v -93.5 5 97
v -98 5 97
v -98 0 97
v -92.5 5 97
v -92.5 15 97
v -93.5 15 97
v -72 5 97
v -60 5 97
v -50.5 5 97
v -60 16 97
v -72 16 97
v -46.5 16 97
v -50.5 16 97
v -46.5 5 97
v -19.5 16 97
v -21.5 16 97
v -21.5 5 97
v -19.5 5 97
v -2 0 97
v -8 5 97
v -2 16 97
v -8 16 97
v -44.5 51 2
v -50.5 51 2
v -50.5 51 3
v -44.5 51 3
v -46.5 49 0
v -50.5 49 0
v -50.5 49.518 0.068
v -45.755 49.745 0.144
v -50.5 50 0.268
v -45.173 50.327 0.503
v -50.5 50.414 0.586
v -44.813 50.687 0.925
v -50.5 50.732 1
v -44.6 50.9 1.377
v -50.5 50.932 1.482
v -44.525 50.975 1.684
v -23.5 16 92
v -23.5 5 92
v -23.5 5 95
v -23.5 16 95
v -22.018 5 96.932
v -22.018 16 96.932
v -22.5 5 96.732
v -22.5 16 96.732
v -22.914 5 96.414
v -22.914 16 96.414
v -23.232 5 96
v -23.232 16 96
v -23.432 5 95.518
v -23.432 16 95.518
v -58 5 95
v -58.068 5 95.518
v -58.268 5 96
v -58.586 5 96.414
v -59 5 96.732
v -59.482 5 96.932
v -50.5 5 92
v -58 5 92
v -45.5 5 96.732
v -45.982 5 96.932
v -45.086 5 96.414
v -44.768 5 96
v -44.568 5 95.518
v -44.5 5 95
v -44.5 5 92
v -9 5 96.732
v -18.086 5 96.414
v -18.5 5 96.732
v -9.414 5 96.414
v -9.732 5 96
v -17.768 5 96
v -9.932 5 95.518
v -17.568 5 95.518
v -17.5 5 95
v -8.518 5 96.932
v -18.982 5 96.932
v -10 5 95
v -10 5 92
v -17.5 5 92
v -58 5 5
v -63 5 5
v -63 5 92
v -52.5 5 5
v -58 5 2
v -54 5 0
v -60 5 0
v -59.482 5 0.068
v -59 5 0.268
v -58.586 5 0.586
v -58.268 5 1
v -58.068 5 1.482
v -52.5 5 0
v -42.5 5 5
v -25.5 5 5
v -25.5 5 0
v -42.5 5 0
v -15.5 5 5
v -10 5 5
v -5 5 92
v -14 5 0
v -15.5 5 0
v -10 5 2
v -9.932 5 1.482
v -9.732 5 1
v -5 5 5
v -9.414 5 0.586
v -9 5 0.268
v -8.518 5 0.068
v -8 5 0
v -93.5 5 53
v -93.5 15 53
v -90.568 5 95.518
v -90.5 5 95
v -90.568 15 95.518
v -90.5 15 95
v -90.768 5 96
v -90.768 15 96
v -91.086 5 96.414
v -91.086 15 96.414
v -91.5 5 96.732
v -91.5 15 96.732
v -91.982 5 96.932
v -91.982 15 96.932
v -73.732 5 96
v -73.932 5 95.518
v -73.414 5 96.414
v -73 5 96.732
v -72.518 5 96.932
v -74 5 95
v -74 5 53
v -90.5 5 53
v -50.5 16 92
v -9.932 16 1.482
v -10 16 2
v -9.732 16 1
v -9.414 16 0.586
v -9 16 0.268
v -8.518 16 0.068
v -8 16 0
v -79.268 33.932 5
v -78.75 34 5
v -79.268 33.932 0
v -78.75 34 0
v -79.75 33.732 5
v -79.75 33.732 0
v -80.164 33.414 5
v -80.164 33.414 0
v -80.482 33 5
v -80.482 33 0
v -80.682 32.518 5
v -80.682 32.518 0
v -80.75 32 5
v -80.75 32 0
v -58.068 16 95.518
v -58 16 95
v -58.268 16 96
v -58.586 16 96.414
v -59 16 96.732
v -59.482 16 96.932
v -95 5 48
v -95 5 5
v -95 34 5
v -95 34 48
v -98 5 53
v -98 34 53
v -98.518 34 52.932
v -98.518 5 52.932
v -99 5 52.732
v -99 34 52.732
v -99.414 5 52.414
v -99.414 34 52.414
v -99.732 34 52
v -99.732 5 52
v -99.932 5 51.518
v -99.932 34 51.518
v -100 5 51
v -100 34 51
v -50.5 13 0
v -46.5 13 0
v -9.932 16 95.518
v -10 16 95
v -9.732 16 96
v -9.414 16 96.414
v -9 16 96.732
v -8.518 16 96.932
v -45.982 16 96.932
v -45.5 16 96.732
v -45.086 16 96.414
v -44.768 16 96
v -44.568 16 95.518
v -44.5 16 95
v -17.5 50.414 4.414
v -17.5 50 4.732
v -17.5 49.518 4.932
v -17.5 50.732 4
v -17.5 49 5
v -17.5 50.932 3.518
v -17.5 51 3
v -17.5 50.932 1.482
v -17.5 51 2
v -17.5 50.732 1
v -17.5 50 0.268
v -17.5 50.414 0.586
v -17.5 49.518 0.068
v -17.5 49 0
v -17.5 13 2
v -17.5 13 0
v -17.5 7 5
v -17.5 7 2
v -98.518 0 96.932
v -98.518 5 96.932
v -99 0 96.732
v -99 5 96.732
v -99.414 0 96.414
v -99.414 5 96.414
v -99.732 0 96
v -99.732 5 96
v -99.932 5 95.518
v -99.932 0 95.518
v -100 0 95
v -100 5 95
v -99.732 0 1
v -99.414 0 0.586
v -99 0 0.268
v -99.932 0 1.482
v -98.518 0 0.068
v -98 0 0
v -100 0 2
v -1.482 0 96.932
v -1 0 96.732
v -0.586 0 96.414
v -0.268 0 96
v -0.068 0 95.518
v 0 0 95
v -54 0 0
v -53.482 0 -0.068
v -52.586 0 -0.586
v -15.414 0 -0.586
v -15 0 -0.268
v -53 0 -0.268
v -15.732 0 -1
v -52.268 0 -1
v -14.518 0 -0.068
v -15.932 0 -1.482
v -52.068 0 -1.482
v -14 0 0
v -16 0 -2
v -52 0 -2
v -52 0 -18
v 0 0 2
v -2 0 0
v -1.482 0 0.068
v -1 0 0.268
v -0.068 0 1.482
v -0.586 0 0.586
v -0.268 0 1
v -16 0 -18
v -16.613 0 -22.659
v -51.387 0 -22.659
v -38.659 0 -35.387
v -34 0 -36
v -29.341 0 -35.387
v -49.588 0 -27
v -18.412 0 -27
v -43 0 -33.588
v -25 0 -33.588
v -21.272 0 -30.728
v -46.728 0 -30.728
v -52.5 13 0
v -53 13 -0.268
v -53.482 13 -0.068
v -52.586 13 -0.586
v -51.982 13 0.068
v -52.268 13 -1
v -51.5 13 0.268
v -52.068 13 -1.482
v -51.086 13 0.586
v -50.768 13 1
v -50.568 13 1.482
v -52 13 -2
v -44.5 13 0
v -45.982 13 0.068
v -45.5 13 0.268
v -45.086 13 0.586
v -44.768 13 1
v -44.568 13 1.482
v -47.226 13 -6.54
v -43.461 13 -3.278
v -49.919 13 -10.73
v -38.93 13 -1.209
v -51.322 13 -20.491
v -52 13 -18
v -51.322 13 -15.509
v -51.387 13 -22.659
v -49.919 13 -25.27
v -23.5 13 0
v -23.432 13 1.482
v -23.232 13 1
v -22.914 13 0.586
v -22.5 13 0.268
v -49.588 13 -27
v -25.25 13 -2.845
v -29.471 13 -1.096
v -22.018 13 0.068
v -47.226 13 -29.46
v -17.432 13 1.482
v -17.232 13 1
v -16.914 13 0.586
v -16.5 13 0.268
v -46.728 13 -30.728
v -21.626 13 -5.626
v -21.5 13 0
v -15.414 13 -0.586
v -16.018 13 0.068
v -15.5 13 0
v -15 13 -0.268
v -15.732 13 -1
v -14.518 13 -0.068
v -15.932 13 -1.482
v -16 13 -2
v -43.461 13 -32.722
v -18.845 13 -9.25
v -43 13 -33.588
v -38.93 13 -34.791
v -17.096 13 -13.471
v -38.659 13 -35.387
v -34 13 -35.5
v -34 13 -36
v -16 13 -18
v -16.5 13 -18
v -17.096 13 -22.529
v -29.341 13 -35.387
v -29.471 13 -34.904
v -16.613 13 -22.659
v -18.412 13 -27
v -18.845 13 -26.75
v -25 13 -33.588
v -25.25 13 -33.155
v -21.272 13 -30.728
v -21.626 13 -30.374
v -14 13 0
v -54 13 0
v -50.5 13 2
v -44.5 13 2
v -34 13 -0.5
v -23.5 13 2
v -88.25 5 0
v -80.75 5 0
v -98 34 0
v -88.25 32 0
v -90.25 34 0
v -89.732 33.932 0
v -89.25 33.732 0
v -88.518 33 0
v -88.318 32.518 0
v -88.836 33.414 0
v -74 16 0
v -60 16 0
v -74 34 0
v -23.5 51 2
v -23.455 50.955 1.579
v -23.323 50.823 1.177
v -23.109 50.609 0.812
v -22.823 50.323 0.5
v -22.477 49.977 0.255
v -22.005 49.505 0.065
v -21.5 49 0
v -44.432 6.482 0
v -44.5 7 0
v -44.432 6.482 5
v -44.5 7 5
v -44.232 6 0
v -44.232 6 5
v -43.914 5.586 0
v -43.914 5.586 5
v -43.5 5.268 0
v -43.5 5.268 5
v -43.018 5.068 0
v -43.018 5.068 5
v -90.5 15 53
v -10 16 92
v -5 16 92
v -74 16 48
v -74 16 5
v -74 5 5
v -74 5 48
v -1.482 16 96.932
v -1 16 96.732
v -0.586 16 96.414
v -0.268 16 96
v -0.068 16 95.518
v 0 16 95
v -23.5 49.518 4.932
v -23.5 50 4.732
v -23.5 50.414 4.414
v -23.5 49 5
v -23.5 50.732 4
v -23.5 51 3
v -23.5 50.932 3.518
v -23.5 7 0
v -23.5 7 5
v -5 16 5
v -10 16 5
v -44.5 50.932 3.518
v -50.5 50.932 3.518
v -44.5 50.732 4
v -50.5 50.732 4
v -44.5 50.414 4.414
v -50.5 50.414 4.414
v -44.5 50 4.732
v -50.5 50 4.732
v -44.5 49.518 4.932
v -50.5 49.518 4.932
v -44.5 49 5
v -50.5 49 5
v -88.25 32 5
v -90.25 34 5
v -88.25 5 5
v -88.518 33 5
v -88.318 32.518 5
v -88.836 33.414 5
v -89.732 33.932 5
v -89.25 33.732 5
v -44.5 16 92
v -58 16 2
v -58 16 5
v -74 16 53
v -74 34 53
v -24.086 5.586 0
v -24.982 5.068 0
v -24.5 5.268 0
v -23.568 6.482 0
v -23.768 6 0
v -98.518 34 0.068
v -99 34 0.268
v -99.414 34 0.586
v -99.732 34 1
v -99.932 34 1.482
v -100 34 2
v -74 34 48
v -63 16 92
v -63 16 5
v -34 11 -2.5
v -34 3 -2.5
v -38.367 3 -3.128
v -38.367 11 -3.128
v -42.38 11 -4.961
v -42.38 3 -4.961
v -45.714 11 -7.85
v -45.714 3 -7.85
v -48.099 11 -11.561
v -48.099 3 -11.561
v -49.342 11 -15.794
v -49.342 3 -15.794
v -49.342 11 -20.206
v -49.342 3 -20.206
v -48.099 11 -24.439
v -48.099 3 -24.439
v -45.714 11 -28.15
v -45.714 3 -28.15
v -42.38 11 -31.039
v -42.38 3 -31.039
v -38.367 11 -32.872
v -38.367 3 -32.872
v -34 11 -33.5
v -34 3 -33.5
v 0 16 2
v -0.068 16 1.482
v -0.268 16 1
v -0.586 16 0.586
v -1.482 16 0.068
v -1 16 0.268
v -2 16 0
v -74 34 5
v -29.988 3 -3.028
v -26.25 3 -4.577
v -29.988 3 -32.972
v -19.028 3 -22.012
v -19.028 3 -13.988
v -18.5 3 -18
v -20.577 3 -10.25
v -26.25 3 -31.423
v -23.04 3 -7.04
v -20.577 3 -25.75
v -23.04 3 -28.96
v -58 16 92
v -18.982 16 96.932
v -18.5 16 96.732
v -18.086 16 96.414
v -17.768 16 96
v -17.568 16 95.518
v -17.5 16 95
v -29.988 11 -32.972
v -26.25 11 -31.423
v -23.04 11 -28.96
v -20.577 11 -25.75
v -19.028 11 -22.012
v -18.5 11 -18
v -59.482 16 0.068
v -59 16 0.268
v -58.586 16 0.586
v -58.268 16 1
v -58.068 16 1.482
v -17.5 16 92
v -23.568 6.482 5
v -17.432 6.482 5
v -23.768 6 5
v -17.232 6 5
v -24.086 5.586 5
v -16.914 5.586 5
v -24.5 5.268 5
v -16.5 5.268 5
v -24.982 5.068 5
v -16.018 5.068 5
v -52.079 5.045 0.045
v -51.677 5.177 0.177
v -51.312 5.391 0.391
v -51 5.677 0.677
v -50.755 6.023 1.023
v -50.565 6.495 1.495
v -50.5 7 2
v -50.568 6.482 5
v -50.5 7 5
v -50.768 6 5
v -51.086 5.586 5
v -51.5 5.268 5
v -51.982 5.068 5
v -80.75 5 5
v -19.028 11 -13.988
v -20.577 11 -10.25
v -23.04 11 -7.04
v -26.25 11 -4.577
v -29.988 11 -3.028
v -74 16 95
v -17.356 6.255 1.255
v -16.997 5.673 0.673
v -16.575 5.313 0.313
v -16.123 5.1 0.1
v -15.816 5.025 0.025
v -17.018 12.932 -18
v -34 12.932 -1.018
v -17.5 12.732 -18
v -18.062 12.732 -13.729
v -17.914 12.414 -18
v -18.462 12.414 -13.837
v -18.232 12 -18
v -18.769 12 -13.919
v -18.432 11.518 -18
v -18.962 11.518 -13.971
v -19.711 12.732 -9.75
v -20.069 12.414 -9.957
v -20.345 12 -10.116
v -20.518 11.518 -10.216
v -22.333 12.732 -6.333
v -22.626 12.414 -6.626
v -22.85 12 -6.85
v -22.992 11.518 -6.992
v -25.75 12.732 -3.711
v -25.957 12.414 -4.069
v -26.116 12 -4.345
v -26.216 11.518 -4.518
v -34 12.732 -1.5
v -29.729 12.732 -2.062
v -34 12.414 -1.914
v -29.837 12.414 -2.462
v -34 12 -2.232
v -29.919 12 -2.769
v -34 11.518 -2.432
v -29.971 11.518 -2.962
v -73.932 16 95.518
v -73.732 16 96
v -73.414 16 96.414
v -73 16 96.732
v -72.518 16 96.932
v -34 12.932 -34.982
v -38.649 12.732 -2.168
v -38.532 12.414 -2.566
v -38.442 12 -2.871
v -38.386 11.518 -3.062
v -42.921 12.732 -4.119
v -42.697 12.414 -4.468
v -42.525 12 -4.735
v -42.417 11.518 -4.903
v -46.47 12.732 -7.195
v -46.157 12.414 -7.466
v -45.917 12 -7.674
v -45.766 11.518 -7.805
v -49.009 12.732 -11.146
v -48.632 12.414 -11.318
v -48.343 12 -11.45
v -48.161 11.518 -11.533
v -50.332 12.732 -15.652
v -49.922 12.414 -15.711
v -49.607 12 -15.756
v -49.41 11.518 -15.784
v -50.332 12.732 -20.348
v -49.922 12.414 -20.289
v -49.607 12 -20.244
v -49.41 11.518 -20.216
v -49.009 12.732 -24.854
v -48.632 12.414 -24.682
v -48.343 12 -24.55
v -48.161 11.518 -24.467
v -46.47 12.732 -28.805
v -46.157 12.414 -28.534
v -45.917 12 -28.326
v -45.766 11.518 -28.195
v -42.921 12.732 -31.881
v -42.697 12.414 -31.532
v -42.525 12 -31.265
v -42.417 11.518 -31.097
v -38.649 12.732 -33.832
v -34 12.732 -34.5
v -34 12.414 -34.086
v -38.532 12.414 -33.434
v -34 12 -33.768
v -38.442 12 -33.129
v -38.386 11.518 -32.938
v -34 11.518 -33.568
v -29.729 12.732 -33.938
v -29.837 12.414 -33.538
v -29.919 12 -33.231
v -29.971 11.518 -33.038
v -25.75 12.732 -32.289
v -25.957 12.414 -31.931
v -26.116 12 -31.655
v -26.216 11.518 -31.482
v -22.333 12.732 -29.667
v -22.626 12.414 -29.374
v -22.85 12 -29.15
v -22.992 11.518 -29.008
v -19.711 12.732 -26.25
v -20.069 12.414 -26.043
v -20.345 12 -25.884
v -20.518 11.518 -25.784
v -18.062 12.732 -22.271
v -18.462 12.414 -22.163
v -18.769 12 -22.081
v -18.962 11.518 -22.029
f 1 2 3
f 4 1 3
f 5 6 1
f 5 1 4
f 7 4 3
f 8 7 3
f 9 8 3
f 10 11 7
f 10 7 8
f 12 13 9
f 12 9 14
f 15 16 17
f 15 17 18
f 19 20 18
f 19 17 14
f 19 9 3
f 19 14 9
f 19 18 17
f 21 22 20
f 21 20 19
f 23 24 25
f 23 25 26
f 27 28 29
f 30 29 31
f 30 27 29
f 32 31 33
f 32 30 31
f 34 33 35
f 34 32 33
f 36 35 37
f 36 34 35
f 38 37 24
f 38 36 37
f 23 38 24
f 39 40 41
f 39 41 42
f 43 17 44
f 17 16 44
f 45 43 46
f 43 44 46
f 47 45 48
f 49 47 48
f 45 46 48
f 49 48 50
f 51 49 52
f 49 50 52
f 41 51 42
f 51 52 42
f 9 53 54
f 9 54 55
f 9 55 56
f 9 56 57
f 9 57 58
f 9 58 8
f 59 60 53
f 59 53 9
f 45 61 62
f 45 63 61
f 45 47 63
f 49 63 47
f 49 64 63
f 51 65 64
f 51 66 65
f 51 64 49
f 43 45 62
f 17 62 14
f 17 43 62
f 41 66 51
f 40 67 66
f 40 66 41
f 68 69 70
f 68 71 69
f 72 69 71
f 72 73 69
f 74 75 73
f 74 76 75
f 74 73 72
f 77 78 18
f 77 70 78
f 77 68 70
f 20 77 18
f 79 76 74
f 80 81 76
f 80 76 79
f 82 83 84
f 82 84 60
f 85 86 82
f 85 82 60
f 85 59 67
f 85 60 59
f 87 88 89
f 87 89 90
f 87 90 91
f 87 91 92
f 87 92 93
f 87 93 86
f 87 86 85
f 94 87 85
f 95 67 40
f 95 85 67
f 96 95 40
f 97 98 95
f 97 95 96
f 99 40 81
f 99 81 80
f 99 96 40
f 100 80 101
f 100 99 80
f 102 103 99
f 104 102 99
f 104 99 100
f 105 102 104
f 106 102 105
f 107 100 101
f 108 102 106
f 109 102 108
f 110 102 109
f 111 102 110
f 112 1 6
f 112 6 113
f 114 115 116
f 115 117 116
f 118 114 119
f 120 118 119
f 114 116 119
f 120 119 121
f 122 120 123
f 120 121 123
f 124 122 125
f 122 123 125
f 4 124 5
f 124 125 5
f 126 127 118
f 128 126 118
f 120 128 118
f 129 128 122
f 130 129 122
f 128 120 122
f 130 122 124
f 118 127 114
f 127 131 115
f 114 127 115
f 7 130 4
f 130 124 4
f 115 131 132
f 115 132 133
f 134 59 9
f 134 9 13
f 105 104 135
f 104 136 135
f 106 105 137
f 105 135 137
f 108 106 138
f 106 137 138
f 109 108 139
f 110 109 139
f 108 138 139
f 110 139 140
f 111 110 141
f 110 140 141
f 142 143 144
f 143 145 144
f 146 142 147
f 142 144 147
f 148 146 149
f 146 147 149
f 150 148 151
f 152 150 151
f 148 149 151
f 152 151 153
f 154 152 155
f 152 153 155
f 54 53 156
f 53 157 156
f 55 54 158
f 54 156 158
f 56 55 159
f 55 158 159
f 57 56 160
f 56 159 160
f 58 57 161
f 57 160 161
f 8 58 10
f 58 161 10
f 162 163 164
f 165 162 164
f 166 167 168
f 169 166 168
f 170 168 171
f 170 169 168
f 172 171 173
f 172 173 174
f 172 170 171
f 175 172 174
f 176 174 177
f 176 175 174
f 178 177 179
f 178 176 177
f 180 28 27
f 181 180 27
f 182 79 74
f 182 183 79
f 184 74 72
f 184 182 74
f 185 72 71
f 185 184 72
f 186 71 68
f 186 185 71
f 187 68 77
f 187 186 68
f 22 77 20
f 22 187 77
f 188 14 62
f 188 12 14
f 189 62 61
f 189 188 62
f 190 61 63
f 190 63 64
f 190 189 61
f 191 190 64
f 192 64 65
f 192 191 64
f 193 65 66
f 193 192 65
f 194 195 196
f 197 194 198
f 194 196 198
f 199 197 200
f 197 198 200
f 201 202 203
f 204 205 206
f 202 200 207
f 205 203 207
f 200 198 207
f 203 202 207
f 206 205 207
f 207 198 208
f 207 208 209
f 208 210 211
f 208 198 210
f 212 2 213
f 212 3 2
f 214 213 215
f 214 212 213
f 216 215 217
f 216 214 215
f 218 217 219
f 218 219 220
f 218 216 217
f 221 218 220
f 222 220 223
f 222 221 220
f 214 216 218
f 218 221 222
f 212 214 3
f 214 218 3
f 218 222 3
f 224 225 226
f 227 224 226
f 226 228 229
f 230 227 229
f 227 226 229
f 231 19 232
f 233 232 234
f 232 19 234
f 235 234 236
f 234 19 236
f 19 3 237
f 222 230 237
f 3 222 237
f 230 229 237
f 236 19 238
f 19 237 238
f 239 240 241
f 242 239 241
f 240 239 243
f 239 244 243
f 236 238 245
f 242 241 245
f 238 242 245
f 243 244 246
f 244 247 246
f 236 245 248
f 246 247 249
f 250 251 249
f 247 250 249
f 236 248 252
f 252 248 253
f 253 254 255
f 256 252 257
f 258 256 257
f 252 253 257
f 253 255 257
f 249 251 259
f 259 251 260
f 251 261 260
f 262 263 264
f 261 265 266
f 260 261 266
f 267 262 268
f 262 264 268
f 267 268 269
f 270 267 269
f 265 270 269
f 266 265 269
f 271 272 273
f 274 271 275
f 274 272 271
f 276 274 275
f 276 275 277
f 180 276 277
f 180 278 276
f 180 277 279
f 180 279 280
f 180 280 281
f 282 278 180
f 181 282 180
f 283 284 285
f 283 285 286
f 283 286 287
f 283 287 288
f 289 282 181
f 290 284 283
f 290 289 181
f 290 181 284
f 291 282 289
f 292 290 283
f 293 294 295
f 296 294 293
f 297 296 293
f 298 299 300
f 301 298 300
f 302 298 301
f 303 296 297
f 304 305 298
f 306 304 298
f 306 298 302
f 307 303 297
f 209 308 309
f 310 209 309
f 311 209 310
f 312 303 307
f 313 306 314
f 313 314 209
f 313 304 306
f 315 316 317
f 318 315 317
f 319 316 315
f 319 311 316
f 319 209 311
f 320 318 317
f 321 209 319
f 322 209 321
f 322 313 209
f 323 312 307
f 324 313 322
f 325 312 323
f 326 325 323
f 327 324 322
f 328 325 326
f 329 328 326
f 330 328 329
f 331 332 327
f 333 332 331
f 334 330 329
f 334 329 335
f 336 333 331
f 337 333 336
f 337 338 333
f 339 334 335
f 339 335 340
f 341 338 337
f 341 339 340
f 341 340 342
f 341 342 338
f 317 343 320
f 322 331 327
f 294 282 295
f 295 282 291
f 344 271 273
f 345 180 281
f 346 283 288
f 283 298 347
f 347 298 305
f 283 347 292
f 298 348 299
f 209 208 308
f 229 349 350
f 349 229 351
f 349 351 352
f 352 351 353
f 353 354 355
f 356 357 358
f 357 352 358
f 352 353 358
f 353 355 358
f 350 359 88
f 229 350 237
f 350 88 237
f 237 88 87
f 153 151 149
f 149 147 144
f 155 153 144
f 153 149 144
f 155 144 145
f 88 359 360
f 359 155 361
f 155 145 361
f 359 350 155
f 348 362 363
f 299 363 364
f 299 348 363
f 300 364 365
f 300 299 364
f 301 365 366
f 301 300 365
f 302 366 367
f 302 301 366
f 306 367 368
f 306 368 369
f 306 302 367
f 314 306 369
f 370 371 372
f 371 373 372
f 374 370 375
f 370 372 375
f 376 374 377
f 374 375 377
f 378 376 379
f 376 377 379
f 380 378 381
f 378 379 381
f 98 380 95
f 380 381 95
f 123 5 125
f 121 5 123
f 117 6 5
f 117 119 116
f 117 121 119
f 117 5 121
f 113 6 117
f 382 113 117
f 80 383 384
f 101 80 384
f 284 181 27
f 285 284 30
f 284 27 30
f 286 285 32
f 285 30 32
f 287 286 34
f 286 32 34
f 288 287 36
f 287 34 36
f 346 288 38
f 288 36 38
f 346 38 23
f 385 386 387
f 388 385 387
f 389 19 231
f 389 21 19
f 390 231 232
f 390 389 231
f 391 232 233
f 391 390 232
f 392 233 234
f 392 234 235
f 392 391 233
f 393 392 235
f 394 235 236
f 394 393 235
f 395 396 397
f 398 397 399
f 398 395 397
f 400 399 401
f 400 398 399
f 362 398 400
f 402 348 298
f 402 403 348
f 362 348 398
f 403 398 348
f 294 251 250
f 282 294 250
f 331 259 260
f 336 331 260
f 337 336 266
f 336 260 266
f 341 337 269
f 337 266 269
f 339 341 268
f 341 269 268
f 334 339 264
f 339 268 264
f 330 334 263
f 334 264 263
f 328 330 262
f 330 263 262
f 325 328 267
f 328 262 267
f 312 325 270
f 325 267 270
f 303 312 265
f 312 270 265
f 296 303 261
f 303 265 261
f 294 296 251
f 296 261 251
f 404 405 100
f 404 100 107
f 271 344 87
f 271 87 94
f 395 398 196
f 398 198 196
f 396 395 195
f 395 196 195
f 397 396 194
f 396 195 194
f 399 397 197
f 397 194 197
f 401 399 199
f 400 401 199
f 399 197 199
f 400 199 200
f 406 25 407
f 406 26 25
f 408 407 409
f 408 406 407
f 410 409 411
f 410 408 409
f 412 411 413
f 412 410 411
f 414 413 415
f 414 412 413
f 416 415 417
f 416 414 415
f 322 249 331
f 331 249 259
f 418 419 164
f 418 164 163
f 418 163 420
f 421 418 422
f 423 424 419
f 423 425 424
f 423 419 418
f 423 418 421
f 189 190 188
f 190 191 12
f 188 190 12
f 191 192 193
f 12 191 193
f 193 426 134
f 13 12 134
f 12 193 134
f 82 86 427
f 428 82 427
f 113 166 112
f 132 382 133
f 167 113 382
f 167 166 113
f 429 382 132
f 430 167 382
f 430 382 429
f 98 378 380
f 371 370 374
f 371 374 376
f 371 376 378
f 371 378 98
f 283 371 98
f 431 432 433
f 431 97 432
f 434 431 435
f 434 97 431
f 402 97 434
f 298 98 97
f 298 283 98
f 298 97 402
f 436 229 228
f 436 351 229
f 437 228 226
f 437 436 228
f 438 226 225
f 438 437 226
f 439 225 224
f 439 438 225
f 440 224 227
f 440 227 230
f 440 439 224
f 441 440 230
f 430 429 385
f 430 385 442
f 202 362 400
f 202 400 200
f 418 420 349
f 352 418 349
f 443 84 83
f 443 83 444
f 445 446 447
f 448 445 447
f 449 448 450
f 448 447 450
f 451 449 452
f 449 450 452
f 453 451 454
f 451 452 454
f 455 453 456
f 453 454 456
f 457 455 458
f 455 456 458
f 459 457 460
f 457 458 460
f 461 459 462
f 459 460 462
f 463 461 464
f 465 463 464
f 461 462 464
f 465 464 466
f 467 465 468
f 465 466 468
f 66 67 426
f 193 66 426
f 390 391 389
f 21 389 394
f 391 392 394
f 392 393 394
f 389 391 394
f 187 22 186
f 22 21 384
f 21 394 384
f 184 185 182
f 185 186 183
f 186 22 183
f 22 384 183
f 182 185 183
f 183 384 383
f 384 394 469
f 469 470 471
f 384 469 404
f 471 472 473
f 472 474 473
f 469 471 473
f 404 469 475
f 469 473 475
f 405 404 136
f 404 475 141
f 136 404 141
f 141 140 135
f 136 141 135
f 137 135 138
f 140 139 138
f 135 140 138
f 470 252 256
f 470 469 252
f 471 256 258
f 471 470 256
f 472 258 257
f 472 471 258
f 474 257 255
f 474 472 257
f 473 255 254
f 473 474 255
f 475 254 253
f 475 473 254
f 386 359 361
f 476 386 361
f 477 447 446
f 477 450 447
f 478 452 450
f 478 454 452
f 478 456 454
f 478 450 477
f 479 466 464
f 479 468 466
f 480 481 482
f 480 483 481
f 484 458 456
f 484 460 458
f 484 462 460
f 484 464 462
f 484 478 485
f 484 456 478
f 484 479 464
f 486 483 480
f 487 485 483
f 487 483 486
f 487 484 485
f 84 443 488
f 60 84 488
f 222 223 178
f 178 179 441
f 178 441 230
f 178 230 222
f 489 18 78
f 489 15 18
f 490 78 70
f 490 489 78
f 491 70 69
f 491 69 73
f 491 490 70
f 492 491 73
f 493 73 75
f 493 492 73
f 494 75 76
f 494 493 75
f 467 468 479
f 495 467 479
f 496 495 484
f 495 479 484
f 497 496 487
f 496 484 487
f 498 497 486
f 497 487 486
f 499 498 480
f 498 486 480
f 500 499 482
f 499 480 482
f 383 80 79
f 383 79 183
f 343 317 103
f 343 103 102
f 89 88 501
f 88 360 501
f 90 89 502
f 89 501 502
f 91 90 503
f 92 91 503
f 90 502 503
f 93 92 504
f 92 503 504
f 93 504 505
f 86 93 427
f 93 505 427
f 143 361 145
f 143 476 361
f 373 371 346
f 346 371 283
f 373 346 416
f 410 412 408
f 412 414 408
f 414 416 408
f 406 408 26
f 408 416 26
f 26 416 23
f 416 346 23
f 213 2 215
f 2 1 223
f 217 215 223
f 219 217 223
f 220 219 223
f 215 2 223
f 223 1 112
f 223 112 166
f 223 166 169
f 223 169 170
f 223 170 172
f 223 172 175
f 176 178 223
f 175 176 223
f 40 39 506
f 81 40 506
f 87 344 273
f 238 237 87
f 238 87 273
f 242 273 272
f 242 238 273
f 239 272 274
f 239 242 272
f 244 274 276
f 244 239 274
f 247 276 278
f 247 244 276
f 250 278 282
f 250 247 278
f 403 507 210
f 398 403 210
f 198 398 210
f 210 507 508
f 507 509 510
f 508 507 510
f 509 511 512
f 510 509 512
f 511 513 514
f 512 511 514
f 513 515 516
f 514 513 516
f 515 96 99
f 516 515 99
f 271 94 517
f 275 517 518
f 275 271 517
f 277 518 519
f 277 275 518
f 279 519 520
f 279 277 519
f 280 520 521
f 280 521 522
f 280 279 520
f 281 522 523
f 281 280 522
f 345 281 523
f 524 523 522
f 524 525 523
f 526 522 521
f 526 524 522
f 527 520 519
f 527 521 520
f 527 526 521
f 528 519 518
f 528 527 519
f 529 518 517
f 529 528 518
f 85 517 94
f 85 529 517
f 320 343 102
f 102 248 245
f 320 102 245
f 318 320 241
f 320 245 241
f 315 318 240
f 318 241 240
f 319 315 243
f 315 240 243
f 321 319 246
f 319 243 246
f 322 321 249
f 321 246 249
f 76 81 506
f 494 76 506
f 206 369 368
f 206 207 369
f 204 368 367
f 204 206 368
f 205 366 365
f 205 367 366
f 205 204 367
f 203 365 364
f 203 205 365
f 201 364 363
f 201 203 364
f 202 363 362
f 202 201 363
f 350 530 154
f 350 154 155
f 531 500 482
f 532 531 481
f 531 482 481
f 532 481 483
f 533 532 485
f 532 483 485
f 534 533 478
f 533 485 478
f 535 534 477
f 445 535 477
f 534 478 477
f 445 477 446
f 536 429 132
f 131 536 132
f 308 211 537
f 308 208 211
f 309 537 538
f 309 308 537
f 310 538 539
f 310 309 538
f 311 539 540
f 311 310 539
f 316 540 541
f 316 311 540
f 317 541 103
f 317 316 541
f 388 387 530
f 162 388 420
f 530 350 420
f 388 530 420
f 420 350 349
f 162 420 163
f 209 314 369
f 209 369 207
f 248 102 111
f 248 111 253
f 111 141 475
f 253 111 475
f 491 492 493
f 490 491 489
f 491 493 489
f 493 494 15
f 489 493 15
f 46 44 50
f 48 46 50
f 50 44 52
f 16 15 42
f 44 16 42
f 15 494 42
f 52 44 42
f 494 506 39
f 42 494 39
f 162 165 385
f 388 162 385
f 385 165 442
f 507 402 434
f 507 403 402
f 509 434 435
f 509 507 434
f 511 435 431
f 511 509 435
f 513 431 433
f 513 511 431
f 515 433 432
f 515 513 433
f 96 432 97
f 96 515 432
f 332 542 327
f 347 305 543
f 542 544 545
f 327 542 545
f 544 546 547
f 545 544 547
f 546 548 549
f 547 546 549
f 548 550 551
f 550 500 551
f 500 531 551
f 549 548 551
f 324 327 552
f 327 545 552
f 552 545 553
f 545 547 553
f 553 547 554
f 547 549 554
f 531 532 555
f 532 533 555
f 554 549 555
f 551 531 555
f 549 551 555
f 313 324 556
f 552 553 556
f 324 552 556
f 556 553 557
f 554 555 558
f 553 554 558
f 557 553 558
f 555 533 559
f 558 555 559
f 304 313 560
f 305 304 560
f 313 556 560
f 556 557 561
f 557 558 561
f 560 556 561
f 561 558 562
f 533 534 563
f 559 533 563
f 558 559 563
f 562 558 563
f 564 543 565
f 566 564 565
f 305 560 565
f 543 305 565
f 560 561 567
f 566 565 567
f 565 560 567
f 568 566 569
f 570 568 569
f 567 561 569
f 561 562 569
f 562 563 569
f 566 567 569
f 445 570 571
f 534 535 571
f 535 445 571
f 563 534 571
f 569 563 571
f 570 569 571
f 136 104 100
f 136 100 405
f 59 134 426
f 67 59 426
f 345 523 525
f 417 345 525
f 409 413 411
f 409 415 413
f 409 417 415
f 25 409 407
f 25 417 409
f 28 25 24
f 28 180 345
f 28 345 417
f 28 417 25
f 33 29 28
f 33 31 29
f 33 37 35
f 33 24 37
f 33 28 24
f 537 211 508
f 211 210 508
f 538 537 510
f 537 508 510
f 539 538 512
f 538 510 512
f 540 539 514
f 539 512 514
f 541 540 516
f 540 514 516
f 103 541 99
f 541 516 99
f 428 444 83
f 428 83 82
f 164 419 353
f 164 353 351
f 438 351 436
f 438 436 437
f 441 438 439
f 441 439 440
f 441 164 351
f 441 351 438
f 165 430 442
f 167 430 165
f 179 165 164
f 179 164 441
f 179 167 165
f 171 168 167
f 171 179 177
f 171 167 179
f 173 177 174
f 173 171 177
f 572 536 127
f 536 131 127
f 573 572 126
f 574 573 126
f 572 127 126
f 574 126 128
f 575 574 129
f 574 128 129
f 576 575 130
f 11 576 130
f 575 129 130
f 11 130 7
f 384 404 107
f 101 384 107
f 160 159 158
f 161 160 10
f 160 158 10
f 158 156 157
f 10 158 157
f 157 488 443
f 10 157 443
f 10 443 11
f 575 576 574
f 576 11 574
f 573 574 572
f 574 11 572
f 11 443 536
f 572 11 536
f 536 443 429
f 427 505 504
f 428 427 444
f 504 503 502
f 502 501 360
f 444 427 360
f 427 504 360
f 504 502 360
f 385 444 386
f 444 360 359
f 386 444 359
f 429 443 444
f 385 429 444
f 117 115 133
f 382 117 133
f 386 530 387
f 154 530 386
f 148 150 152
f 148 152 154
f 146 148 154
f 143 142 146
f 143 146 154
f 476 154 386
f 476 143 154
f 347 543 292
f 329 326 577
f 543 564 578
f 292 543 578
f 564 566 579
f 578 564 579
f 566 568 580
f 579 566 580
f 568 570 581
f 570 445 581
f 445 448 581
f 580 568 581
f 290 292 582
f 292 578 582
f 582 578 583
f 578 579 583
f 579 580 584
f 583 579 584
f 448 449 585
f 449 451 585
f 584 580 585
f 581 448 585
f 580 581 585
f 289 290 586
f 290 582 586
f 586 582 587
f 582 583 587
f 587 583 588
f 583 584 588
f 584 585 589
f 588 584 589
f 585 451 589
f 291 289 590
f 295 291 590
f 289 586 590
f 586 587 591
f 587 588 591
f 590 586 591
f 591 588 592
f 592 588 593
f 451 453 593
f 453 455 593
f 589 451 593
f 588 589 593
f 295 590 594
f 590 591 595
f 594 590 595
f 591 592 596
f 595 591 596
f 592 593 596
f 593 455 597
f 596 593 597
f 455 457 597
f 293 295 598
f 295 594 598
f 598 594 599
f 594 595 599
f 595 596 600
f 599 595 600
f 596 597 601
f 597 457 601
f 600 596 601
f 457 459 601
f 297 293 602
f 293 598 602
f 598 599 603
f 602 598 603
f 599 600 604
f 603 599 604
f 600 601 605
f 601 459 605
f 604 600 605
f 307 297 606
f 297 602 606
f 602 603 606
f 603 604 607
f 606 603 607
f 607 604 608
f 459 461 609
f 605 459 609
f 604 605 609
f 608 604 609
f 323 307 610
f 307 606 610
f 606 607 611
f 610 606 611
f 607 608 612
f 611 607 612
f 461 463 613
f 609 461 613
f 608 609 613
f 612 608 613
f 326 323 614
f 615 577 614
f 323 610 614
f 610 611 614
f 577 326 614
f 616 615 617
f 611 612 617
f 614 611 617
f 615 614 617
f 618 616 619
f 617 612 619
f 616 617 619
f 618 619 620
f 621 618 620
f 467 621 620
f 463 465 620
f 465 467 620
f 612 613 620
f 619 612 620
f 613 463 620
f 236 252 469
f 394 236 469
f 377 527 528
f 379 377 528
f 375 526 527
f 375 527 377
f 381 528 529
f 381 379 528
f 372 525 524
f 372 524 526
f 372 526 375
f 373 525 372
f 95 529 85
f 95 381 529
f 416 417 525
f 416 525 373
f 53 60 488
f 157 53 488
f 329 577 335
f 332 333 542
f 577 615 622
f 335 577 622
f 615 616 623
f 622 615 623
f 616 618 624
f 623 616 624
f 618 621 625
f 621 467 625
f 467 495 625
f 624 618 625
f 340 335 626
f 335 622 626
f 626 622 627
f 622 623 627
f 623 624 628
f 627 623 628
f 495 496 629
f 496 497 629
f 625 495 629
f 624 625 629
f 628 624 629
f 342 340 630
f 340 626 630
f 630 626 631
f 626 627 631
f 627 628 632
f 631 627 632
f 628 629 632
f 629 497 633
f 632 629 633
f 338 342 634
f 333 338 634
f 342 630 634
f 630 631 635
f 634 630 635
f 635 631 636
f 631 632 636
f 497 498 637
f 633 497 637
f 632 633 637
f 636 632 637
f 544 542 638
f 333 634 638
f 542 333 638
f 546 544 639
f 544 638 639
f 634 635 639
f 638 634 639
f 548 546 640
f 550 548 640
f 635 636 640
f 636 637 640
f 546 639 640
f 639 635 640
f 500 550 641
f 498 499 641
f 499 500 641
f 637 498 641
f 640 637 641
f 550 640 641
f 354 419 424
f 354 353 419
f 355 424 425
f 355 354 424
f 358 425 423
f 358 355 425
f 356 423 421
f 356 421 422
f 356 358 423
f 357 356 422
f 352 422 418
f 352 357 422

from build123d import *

# Parameters (mm, degrees)
BOSS_EXTRUDE1_DEPTH      = 92
SKETCH2_4_W              = 5
SKETCH2_4_H              = 29
SKETCH2_4_W_2            = 58
SKETCH2_4_H_2            = 11
BOSS_EXTRUDE2_DEPTH      = 5
SKETCH2_6_W              = 5
SKETCH2_6_H              = 29
BOSS_EXTRUDE3_DEPTH      = 53
BOSS_EXTRUDE4_DEPTH      = 5
SKETCH6_W                = 3.75
SKETCH6_H                = 5
CUT_EXTRUDE1_DEPTH       = 29
BOSS_EXTRUDE5_DEPTH      = 3
BOSS_EXTRUDE6_DEPTH      = 13
SKETCH9_W                = 58
SKETCH9_H                = 11
BOSS_EXTRUDE7_DEPTH      = 5
SKETCH13_W               = 3
SKETCH13_H               = 44
BOSS_EXTRUDE9_DEPTH      = 10
FILLET1_R                = 2
CUT_EXTRUDE2_START       = -97
CUT_EXTRUDE2_OUTLINE_W   = 7.5
CUT_EXTRUDE2_OUTLINE_H   = 11
CUT_EXTRUDE2_OUTLINE_W_2 = 21
CUT_EXTRUDE2_DEPTH       = 97
SKETCH11_W               = 6
SKETCH11_H               = 5
BOSS_EXTRUDE8_DEPTH      = 35
FILLET2_R                = 2


# Read off the part's stored shape, not the designer's step: Cut-Extrude2
with BuildPart() as part:
    # Sketch2 → Boss-Extrude1 (new body)
    with BuildSketch(Plane.XY):
        Polygon((0, 16), (-5, 16), (-5, 5), (-63, 5), (-63, 16), (-74, 16), (-74, 5), (-100, 5), (-100, 0), (0, 0), align=None)
    extrude(amount=BOSS_EXTRUDE1_DEPTH)

    # Sketch2<4> → Boss-Extrude2 (add)
    with BuildSketch(Plane.XY):
        Polygon((-74, 0), (-74, 5), (-95, 5), (-100, 5), (-100, 0), align=None)
        with Locations((-97.5, 19.5)):
            Rectangle(SKETCH2_4_W, SKETCH2_4_H)
        Polygon((-74, 5), (-74, 16), (-74, 34), (-95, 34), (-95, 5), align=None)
        with Locations((-34, 10.5)):
            Rectangle(SKETCH2_4_W_2, SKETCH2_4_H_2)
    extrude(amount=BOSS_EXTRUDE2_DEPTH)

    # Sketch2<6> → Boss-Extrude3 (add)
    with BuildSketch(Plane.XY):
        Polygon((-74, 0), (-74, 5), (-95, 5), (-100, 5), (-100, 0), align=None)
        with Locations((-97.5, 19.5)):
            Rectangle(SKETCH2_6_W, SKETCH2_6_H)
    extrude(amount=BOSS_EXTRUDE3_DEPTH)

    # Sketch3 → Boss-Extrude4 (add)
    with BuildSketch(Plane.XY.offset(53)):
        Polygon((-95, 34), (-95, 5), (-74, 5), (-74, 16), (-74, 34), align=None)
    extrude(amount=-BOSS_EXTRUDE4_DEPTH)

    # Sketch6 → Cut-Extrude1 (cut)
    with BuildSketch(Plane(origin=(0, 34, 0), x_dir=(1, 0, 0), z_dir=(0, 1, 0))):
        with Locations((-82.625, -2.5)):
            Rectangle(SKETCH6_W, SKETCH6_H)
        with Locations((-86.375, -2.5)):
            Rectangle(SKETCH6_W, SKETCH6_H)
    extrude(amount=-CUT_EXTRUDE1_DEPTH, mode=Mode.SUBTRACT)

    # Sketch7 → Boss-Extrude5 (add)
    with BuildSketch(Plane(origin=(0, 0, 0), x_dir=(1, 0, 0), z_dir=(0, 1, 0))):
        with BuildLine():
            ThreePointArc((-16, 18), (-21.272077939, 5.272077939), (-34, 0))
            Line((-34, 0), (-16, 0))
            Line((-16, 0), (-16, 18))
        make_face()
        with BuildLine():
            Line((-52, 0), (-34, 0))
            ThreePointArc((-34, 0), (-46.727922061, 5.272077939), (-52, 18))
            Line((-52, 18), (-52, 0))
        make_face()
        with BuildLine():
            ThreePointArc((-52, 18), (-46.727922061, 5.272077939), (-34, 0))
            Line((-34, 0), (-34, 2.5))
            ThreePointArc((-34, 2.5), (-49.5, 18), (-34, 33.5))
            Line((-34, 33.5), (-34, 36))
            ThreePointArc((-34, 36), (-46.727922061, 30.727922061), (-52, 18))
        make_face()
        with BuildLine():
            Line((-34, 2.5), (-34, 0))
            ThreePointArc((-34, 0), (-21.272077939, 5.272077939), (-16, 18))
            ThreePointArc((-16, 18), (-21.272077939, 30.727922061), (-34, 36))
            Line((-34, 36), (-34, 33.5))
            ThreePointArc((-34, 33.5), (-23.039844892, 28.960155108), (-18.5, 18))
            ThreePointArc((-18.5, 18), (-23.039844892, 7.039844892), (-34, 2.5))
        make_face()
        with BuildLine():
            ThreePointArc((-34, 33.5), (-49.5, 18), (-34, 2.5))
            Line((-34, 2.5), (-34, 33.5))
        make_face()
        with BuildLine():
            Line((-34, 33.5), (-34, 2.5))
            ThreePointArc((-34, 2.5), (-23.039844892, 7.039844892), (-18.5, 18))
            ThreePointArc((-18.5, 18), (-23.039844892, 28.960155108), (-34, 33.5))
        make_face()
    extrude(amount=BOSS_EXTRUDE5_DEPTH)

    # Sketch7<3> → Boss-Extrude6 (add)
    with BuildSketch(Plane(origin=(0, 0, 0), x_dir=(1, 0, 0), z_dir=(0, 1, 0))):
        with BuildLine():
            Line((-52, 0), (-34, 0))
            ThreePointArc((-34, 0), (-46.727922061, 5.272077939), (-52, 18))
            Line((-52, 18), (-52, 0))
        make_face()
        with BuildLine():
            ThreePointArc((-52, 18), (-46.727922061, 5.272077939), (-34, 0))
            Line((-34, 0), (-34, 2.5))
            ThreePointArc((-34, 2.5), (-49.5, 18), (-34, 33.5))
            Line((-34, 33.5), (-34, 36))
            ThreePointArc((-34, 36), (-46.727922061, 30.727922061), (-52, 18))
        make_face()
        with BuildLine():
            Line((-34, 2.5), (-34, 0))
            ThreePointArc((-34, 0), (-21.272077939, 5.272077939), (-16, 18))
            ThreePointArc((-16, 18), (-21.272077939, 30.727922061), (-34, 36))
            Line((-34, 36), (-34, 33.5))
            ThreePointArc((-34, 33.5), (-23.039844892, 28.960155108), (-18.5, 18))
            ThreePointArc((-18.5, 18), (-23.039844892, 7.039844892), (-34, 2.5))
        make_face()
        with BuildLine():
            ThreePointArc((-16, 18), (-21.272077939, 5.272077939), (-34, 0))
            Line((-34, 0), (-16, 0))
            Line((-16, 0), (-16, 18))
        make_face()
    extrude(amount=BOSS_EXTRUDE6_DEPTH)

    # Sketch9 → Boss-Extrude7 (add)
    with BuildSketch(Plane.XY.offset(92)):
        with Locations((-34, 10.5)):
            Rectangle(SKETCH9_W, SKETCH9_H)
        Polygon((-63, 16), (-74, 16), (-74, 5), (-100, 5), (-100, 0), (0, 0), (0, 16), (-5, 16), (-5, 5), (-63, 5), align=None)
    extrude(amount=BOSS_EXTRUDE7_DEPTH)

    # Sketch13 → Boss-Extrude9 (add)
    with BuildSketch(Plane(origin=(0, 5, 0), x_dir=(1, 0, 0), z_dir=(0, 1, 0))):
        with Locations((-92, -75)):
            Rectangle(SKETCH13_W, SKETCH13_H)
    extrude(amount=BOSS_EXTRUDE9_DEPTH)

    # Fillet1
    fillet1_edges = [part.edges().sort_by_distance(p)[0] for p in [
        (-100, 19.5, 53),
        (0, 8, 0),
        (-80.75, 34, 2.5),
        (-88.25, 34, 2.5),
        (-16, 6.5, 0),
        (-52, 6.5, 0),
        (-34, 13, -2.5),
        (-74, 10.5, 97),
        (-100, 2.5, 97),
        (0, 8, 97),
        (-100, 17, 0),
    ]]
    fillet(fillet1_edges, radius=FILLET1_R)

    # Cut-Extrude2 outline → Cut-Extrude2 (cut)
    with BuildSketch(Plane.XY.offset(97).offset(CUT_EXTRUDE2_START)):
        with Locations((-13.75, 10.5)):
            Rectangle(CUT_EXTRUDE2_OUTLINE_W, CUT_EXTRUDE2_OUTLINE_H)
        with Locations((-34, 10.5)):
            Rectangle(CUT_EXTRUDE2_OUTLINE_W_2, CUT_EXTRUDE2_OUTLINE_H)
        with Locations((-54.25, 10.5)):
            Rectangle(CUT_EXTRUDE2_OUTLINE_W, CUT_EXTRUDE2_OUTLINE_H)
    extrude(amount=CUT_EXTRUDE2_DEPTH, mode=Mode.SUBTRACT)

    # Sketch11 → Boss-Extrude8 (add)
    with BuildSketch(Plane(origin=(0, 16, 0), x_dir=(1, 0, 0), z_dir=(0, 1, 0))):
        with Locations((-20.5, -2.5)):
            Rectangle(SKETCH11_W, SKETCH11_H)
        with Locations((-47.5, -2.5)):
            Rectangle(SKETCH11_W, SKETCH11_H)
    extrude(amount=BOSS_EXTRUDE8_DEPTH)

    # Fillet2
    fillet2_edges = [part.edges().sort_by_distance(p)[0] for p in [
        (-90.5, 10, 97),
        (-10, 10.5, 97),
        (-17.5, 10.5, 97),
        (-10, 10.5, 0),
        (-17.5, 5, 2.5),
        (-17.5, 9, 0),
        (-58, 10.5, 0),
        (-58, 10.5, 97),
        (-50.5, 9, 0),
        (-50.5, 5, 2.5),
        (-44.5, 32, 0),
        (-23.5, 10.5, 97),
        (-23.5, 5, 2.5),
        (-44.5, 5, 2.5),
        (-44.5, 10.5, 97),
        (-23.5, 32, 0),
        (-20.5, 51, 0),
        (-20.5, 51, 5),
        (-47.5, 51, 0),
        (-47.5, 51, 5),
    ]]
    fillet(fillet2_edges, radius=FILLET2_R)


solid = part.part
